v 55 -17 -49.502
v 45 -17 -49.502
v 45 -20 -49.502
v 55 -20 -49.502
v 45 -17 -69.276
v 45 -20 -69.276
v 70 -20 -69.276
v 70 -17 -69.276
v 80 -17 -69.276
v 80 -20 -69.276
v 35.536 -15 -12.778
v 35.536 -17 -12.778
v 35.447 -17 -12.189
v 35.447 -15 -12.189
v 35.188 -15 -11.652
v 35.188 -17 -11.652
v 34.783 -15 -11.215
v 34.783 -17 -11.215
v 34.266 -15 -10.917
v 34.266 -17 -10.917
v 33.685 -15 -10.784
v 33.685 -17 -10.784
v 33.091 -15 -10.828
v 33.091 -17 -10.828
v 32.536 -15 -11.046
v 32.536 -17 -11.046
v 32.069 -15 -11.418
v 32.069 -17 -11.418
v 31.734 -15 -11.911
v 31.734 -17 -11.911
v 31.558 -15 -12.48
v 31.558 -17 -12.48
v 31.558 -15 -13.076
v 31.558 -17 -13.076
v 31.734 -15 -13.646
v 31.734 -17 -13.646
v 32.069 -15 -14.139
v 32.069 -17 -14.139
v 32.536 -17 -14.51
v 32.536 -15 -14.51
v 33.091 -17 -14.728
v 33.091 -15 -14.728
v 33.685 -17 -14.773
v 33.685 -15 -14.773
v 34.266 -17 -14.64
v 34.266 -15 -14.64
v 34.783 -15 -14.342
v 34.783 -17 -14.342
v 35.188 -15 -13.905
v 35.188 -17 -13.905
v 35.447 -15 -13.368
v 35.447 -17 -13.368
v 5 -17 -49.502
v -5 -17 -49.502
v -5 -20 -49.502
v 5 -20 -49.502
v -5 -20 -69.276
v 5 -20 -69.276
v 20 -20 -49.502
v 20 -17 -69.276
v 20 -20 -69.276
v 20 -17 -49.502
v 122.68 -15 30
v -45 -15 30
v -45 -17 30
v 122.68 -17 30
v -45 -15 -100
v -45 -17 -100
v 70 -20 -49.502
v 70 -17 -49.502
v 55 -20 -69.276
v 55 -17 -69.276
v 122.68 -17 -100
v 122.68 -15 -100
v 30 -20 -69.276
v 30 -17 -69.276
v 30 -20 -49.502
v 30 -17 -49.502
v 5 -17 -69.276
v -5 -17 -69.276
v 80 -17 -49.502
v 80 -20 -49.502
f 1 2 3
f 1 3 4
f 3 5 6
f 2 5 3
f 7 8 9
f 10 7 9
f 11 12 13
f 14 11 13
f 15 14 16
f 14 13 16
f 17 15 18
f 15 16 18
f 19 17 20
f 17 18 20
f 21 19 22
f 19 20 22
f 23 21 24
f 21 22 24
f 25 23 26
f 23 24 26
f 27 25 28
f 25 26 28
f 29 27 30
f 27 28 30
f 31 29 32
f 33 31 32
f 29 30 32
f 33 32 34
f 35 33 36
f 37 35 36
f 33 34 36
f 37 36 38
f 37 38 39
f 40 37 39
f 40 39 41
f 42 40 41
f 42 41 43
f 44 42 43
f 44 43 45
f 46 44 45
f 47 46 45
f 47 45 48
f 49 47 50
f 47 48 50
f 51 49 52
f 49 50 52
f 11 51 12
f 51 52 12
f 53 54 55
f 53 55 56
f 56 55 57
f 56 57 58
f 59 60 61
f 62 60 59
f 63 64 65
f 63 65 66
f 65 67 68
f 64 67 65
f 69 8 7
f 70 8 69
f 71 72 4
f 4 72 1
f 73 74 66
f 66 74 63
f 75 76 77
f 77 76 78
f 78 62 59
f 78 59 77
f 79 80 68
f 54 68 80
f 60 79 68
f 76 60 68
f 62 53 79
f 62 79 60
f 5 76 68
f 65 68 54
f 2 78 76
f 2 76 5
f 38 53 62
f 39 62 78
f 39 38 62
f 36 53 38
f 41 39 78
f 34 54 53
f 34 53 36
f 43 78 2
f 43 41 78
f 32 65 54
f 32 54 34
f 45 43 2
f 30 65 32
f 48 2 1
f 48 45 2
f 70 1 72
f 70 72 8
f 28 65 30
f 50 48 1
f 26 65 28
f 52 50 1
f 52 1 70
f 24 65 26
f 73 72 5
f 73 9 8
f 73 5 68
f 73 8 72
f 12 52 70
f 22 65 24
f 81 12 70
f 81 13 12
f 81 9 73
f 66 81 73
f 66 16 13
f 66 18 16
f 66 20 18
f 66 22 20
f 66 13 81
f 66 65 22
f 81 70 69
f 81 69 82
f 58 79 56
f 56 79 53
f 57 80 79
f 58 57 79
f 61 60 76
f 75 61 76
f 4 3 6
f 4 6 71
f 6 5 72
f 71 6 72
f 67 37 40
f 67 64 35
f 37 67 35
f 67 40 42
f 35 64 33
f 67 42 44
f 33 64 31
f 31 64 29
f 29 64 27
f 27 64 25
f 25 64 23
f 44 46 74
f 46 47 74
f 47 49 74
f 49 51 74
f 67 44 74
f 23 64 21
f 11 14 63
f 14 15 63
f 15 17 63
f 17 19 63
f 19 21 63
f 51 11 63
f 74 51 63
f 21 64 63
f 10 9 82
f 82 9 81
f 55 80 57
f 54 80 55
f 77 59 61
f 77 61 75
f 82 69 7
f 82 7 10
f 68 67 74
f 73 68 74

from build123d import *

# Parameters (mm, degrees)
SKETCH_3_W          = 167.68
SKETCH_3_H          = 130
EXTRUDE_1_DEPTH     = 2
SKETCH_5_R          = 2
CUT_EXTRUDE_1_DEPTH = 2
SKETCH_6_W          = 10
SKETCH_6_H          = 19.7733087
EXTRUDE_2_DEPTH     = 3


with BuildPart() as part:
    # 스케치3 → 보스-돌출1 (new body)
    with BuildSketch(Plane.XZ.offset(15)):
        with Locations((38.84, -35)):
            Rectangle(SKETCH_3_W, SKETCH_3_H)
    extrude(amount=EXTRUDE_1_DEPTH)

    # 스케치5 → 컷-돌출1 (cut)
    with BuildSketch(Plane.XZ.offset(17)):
        with Locations((33.535545215, -12.778353339)):
            Circle(SKETCH_5_R)
    extrude(amount=-CUT_EXTRUDE_1_DEPTH, mode=Mode.SUBTRACT)

    # 스케치6 → 보스-돌출2 (add)
    with BuildSketch(Plane.XZ.offset(17)):
        with Locations((0, -59.389009604)):
            Rectangle(SKETCH_6_W, SKETCH_6_H)
        with Locations((25, -59.389009604)):
            Rectangle(SKETCH_6_W, SKETCH_6_H)
        with Locations((50, -59.389009604)):
            Rectangle(SKETCH_6_W, SKETCH_6_H)
        with Locations((75, -59.389009604)):
            Rectangle(SKETCH_6_W, SKETCH_6_H)
    extrude(amount=EXTRUDE_2_DEPTH)


solid = part.part
